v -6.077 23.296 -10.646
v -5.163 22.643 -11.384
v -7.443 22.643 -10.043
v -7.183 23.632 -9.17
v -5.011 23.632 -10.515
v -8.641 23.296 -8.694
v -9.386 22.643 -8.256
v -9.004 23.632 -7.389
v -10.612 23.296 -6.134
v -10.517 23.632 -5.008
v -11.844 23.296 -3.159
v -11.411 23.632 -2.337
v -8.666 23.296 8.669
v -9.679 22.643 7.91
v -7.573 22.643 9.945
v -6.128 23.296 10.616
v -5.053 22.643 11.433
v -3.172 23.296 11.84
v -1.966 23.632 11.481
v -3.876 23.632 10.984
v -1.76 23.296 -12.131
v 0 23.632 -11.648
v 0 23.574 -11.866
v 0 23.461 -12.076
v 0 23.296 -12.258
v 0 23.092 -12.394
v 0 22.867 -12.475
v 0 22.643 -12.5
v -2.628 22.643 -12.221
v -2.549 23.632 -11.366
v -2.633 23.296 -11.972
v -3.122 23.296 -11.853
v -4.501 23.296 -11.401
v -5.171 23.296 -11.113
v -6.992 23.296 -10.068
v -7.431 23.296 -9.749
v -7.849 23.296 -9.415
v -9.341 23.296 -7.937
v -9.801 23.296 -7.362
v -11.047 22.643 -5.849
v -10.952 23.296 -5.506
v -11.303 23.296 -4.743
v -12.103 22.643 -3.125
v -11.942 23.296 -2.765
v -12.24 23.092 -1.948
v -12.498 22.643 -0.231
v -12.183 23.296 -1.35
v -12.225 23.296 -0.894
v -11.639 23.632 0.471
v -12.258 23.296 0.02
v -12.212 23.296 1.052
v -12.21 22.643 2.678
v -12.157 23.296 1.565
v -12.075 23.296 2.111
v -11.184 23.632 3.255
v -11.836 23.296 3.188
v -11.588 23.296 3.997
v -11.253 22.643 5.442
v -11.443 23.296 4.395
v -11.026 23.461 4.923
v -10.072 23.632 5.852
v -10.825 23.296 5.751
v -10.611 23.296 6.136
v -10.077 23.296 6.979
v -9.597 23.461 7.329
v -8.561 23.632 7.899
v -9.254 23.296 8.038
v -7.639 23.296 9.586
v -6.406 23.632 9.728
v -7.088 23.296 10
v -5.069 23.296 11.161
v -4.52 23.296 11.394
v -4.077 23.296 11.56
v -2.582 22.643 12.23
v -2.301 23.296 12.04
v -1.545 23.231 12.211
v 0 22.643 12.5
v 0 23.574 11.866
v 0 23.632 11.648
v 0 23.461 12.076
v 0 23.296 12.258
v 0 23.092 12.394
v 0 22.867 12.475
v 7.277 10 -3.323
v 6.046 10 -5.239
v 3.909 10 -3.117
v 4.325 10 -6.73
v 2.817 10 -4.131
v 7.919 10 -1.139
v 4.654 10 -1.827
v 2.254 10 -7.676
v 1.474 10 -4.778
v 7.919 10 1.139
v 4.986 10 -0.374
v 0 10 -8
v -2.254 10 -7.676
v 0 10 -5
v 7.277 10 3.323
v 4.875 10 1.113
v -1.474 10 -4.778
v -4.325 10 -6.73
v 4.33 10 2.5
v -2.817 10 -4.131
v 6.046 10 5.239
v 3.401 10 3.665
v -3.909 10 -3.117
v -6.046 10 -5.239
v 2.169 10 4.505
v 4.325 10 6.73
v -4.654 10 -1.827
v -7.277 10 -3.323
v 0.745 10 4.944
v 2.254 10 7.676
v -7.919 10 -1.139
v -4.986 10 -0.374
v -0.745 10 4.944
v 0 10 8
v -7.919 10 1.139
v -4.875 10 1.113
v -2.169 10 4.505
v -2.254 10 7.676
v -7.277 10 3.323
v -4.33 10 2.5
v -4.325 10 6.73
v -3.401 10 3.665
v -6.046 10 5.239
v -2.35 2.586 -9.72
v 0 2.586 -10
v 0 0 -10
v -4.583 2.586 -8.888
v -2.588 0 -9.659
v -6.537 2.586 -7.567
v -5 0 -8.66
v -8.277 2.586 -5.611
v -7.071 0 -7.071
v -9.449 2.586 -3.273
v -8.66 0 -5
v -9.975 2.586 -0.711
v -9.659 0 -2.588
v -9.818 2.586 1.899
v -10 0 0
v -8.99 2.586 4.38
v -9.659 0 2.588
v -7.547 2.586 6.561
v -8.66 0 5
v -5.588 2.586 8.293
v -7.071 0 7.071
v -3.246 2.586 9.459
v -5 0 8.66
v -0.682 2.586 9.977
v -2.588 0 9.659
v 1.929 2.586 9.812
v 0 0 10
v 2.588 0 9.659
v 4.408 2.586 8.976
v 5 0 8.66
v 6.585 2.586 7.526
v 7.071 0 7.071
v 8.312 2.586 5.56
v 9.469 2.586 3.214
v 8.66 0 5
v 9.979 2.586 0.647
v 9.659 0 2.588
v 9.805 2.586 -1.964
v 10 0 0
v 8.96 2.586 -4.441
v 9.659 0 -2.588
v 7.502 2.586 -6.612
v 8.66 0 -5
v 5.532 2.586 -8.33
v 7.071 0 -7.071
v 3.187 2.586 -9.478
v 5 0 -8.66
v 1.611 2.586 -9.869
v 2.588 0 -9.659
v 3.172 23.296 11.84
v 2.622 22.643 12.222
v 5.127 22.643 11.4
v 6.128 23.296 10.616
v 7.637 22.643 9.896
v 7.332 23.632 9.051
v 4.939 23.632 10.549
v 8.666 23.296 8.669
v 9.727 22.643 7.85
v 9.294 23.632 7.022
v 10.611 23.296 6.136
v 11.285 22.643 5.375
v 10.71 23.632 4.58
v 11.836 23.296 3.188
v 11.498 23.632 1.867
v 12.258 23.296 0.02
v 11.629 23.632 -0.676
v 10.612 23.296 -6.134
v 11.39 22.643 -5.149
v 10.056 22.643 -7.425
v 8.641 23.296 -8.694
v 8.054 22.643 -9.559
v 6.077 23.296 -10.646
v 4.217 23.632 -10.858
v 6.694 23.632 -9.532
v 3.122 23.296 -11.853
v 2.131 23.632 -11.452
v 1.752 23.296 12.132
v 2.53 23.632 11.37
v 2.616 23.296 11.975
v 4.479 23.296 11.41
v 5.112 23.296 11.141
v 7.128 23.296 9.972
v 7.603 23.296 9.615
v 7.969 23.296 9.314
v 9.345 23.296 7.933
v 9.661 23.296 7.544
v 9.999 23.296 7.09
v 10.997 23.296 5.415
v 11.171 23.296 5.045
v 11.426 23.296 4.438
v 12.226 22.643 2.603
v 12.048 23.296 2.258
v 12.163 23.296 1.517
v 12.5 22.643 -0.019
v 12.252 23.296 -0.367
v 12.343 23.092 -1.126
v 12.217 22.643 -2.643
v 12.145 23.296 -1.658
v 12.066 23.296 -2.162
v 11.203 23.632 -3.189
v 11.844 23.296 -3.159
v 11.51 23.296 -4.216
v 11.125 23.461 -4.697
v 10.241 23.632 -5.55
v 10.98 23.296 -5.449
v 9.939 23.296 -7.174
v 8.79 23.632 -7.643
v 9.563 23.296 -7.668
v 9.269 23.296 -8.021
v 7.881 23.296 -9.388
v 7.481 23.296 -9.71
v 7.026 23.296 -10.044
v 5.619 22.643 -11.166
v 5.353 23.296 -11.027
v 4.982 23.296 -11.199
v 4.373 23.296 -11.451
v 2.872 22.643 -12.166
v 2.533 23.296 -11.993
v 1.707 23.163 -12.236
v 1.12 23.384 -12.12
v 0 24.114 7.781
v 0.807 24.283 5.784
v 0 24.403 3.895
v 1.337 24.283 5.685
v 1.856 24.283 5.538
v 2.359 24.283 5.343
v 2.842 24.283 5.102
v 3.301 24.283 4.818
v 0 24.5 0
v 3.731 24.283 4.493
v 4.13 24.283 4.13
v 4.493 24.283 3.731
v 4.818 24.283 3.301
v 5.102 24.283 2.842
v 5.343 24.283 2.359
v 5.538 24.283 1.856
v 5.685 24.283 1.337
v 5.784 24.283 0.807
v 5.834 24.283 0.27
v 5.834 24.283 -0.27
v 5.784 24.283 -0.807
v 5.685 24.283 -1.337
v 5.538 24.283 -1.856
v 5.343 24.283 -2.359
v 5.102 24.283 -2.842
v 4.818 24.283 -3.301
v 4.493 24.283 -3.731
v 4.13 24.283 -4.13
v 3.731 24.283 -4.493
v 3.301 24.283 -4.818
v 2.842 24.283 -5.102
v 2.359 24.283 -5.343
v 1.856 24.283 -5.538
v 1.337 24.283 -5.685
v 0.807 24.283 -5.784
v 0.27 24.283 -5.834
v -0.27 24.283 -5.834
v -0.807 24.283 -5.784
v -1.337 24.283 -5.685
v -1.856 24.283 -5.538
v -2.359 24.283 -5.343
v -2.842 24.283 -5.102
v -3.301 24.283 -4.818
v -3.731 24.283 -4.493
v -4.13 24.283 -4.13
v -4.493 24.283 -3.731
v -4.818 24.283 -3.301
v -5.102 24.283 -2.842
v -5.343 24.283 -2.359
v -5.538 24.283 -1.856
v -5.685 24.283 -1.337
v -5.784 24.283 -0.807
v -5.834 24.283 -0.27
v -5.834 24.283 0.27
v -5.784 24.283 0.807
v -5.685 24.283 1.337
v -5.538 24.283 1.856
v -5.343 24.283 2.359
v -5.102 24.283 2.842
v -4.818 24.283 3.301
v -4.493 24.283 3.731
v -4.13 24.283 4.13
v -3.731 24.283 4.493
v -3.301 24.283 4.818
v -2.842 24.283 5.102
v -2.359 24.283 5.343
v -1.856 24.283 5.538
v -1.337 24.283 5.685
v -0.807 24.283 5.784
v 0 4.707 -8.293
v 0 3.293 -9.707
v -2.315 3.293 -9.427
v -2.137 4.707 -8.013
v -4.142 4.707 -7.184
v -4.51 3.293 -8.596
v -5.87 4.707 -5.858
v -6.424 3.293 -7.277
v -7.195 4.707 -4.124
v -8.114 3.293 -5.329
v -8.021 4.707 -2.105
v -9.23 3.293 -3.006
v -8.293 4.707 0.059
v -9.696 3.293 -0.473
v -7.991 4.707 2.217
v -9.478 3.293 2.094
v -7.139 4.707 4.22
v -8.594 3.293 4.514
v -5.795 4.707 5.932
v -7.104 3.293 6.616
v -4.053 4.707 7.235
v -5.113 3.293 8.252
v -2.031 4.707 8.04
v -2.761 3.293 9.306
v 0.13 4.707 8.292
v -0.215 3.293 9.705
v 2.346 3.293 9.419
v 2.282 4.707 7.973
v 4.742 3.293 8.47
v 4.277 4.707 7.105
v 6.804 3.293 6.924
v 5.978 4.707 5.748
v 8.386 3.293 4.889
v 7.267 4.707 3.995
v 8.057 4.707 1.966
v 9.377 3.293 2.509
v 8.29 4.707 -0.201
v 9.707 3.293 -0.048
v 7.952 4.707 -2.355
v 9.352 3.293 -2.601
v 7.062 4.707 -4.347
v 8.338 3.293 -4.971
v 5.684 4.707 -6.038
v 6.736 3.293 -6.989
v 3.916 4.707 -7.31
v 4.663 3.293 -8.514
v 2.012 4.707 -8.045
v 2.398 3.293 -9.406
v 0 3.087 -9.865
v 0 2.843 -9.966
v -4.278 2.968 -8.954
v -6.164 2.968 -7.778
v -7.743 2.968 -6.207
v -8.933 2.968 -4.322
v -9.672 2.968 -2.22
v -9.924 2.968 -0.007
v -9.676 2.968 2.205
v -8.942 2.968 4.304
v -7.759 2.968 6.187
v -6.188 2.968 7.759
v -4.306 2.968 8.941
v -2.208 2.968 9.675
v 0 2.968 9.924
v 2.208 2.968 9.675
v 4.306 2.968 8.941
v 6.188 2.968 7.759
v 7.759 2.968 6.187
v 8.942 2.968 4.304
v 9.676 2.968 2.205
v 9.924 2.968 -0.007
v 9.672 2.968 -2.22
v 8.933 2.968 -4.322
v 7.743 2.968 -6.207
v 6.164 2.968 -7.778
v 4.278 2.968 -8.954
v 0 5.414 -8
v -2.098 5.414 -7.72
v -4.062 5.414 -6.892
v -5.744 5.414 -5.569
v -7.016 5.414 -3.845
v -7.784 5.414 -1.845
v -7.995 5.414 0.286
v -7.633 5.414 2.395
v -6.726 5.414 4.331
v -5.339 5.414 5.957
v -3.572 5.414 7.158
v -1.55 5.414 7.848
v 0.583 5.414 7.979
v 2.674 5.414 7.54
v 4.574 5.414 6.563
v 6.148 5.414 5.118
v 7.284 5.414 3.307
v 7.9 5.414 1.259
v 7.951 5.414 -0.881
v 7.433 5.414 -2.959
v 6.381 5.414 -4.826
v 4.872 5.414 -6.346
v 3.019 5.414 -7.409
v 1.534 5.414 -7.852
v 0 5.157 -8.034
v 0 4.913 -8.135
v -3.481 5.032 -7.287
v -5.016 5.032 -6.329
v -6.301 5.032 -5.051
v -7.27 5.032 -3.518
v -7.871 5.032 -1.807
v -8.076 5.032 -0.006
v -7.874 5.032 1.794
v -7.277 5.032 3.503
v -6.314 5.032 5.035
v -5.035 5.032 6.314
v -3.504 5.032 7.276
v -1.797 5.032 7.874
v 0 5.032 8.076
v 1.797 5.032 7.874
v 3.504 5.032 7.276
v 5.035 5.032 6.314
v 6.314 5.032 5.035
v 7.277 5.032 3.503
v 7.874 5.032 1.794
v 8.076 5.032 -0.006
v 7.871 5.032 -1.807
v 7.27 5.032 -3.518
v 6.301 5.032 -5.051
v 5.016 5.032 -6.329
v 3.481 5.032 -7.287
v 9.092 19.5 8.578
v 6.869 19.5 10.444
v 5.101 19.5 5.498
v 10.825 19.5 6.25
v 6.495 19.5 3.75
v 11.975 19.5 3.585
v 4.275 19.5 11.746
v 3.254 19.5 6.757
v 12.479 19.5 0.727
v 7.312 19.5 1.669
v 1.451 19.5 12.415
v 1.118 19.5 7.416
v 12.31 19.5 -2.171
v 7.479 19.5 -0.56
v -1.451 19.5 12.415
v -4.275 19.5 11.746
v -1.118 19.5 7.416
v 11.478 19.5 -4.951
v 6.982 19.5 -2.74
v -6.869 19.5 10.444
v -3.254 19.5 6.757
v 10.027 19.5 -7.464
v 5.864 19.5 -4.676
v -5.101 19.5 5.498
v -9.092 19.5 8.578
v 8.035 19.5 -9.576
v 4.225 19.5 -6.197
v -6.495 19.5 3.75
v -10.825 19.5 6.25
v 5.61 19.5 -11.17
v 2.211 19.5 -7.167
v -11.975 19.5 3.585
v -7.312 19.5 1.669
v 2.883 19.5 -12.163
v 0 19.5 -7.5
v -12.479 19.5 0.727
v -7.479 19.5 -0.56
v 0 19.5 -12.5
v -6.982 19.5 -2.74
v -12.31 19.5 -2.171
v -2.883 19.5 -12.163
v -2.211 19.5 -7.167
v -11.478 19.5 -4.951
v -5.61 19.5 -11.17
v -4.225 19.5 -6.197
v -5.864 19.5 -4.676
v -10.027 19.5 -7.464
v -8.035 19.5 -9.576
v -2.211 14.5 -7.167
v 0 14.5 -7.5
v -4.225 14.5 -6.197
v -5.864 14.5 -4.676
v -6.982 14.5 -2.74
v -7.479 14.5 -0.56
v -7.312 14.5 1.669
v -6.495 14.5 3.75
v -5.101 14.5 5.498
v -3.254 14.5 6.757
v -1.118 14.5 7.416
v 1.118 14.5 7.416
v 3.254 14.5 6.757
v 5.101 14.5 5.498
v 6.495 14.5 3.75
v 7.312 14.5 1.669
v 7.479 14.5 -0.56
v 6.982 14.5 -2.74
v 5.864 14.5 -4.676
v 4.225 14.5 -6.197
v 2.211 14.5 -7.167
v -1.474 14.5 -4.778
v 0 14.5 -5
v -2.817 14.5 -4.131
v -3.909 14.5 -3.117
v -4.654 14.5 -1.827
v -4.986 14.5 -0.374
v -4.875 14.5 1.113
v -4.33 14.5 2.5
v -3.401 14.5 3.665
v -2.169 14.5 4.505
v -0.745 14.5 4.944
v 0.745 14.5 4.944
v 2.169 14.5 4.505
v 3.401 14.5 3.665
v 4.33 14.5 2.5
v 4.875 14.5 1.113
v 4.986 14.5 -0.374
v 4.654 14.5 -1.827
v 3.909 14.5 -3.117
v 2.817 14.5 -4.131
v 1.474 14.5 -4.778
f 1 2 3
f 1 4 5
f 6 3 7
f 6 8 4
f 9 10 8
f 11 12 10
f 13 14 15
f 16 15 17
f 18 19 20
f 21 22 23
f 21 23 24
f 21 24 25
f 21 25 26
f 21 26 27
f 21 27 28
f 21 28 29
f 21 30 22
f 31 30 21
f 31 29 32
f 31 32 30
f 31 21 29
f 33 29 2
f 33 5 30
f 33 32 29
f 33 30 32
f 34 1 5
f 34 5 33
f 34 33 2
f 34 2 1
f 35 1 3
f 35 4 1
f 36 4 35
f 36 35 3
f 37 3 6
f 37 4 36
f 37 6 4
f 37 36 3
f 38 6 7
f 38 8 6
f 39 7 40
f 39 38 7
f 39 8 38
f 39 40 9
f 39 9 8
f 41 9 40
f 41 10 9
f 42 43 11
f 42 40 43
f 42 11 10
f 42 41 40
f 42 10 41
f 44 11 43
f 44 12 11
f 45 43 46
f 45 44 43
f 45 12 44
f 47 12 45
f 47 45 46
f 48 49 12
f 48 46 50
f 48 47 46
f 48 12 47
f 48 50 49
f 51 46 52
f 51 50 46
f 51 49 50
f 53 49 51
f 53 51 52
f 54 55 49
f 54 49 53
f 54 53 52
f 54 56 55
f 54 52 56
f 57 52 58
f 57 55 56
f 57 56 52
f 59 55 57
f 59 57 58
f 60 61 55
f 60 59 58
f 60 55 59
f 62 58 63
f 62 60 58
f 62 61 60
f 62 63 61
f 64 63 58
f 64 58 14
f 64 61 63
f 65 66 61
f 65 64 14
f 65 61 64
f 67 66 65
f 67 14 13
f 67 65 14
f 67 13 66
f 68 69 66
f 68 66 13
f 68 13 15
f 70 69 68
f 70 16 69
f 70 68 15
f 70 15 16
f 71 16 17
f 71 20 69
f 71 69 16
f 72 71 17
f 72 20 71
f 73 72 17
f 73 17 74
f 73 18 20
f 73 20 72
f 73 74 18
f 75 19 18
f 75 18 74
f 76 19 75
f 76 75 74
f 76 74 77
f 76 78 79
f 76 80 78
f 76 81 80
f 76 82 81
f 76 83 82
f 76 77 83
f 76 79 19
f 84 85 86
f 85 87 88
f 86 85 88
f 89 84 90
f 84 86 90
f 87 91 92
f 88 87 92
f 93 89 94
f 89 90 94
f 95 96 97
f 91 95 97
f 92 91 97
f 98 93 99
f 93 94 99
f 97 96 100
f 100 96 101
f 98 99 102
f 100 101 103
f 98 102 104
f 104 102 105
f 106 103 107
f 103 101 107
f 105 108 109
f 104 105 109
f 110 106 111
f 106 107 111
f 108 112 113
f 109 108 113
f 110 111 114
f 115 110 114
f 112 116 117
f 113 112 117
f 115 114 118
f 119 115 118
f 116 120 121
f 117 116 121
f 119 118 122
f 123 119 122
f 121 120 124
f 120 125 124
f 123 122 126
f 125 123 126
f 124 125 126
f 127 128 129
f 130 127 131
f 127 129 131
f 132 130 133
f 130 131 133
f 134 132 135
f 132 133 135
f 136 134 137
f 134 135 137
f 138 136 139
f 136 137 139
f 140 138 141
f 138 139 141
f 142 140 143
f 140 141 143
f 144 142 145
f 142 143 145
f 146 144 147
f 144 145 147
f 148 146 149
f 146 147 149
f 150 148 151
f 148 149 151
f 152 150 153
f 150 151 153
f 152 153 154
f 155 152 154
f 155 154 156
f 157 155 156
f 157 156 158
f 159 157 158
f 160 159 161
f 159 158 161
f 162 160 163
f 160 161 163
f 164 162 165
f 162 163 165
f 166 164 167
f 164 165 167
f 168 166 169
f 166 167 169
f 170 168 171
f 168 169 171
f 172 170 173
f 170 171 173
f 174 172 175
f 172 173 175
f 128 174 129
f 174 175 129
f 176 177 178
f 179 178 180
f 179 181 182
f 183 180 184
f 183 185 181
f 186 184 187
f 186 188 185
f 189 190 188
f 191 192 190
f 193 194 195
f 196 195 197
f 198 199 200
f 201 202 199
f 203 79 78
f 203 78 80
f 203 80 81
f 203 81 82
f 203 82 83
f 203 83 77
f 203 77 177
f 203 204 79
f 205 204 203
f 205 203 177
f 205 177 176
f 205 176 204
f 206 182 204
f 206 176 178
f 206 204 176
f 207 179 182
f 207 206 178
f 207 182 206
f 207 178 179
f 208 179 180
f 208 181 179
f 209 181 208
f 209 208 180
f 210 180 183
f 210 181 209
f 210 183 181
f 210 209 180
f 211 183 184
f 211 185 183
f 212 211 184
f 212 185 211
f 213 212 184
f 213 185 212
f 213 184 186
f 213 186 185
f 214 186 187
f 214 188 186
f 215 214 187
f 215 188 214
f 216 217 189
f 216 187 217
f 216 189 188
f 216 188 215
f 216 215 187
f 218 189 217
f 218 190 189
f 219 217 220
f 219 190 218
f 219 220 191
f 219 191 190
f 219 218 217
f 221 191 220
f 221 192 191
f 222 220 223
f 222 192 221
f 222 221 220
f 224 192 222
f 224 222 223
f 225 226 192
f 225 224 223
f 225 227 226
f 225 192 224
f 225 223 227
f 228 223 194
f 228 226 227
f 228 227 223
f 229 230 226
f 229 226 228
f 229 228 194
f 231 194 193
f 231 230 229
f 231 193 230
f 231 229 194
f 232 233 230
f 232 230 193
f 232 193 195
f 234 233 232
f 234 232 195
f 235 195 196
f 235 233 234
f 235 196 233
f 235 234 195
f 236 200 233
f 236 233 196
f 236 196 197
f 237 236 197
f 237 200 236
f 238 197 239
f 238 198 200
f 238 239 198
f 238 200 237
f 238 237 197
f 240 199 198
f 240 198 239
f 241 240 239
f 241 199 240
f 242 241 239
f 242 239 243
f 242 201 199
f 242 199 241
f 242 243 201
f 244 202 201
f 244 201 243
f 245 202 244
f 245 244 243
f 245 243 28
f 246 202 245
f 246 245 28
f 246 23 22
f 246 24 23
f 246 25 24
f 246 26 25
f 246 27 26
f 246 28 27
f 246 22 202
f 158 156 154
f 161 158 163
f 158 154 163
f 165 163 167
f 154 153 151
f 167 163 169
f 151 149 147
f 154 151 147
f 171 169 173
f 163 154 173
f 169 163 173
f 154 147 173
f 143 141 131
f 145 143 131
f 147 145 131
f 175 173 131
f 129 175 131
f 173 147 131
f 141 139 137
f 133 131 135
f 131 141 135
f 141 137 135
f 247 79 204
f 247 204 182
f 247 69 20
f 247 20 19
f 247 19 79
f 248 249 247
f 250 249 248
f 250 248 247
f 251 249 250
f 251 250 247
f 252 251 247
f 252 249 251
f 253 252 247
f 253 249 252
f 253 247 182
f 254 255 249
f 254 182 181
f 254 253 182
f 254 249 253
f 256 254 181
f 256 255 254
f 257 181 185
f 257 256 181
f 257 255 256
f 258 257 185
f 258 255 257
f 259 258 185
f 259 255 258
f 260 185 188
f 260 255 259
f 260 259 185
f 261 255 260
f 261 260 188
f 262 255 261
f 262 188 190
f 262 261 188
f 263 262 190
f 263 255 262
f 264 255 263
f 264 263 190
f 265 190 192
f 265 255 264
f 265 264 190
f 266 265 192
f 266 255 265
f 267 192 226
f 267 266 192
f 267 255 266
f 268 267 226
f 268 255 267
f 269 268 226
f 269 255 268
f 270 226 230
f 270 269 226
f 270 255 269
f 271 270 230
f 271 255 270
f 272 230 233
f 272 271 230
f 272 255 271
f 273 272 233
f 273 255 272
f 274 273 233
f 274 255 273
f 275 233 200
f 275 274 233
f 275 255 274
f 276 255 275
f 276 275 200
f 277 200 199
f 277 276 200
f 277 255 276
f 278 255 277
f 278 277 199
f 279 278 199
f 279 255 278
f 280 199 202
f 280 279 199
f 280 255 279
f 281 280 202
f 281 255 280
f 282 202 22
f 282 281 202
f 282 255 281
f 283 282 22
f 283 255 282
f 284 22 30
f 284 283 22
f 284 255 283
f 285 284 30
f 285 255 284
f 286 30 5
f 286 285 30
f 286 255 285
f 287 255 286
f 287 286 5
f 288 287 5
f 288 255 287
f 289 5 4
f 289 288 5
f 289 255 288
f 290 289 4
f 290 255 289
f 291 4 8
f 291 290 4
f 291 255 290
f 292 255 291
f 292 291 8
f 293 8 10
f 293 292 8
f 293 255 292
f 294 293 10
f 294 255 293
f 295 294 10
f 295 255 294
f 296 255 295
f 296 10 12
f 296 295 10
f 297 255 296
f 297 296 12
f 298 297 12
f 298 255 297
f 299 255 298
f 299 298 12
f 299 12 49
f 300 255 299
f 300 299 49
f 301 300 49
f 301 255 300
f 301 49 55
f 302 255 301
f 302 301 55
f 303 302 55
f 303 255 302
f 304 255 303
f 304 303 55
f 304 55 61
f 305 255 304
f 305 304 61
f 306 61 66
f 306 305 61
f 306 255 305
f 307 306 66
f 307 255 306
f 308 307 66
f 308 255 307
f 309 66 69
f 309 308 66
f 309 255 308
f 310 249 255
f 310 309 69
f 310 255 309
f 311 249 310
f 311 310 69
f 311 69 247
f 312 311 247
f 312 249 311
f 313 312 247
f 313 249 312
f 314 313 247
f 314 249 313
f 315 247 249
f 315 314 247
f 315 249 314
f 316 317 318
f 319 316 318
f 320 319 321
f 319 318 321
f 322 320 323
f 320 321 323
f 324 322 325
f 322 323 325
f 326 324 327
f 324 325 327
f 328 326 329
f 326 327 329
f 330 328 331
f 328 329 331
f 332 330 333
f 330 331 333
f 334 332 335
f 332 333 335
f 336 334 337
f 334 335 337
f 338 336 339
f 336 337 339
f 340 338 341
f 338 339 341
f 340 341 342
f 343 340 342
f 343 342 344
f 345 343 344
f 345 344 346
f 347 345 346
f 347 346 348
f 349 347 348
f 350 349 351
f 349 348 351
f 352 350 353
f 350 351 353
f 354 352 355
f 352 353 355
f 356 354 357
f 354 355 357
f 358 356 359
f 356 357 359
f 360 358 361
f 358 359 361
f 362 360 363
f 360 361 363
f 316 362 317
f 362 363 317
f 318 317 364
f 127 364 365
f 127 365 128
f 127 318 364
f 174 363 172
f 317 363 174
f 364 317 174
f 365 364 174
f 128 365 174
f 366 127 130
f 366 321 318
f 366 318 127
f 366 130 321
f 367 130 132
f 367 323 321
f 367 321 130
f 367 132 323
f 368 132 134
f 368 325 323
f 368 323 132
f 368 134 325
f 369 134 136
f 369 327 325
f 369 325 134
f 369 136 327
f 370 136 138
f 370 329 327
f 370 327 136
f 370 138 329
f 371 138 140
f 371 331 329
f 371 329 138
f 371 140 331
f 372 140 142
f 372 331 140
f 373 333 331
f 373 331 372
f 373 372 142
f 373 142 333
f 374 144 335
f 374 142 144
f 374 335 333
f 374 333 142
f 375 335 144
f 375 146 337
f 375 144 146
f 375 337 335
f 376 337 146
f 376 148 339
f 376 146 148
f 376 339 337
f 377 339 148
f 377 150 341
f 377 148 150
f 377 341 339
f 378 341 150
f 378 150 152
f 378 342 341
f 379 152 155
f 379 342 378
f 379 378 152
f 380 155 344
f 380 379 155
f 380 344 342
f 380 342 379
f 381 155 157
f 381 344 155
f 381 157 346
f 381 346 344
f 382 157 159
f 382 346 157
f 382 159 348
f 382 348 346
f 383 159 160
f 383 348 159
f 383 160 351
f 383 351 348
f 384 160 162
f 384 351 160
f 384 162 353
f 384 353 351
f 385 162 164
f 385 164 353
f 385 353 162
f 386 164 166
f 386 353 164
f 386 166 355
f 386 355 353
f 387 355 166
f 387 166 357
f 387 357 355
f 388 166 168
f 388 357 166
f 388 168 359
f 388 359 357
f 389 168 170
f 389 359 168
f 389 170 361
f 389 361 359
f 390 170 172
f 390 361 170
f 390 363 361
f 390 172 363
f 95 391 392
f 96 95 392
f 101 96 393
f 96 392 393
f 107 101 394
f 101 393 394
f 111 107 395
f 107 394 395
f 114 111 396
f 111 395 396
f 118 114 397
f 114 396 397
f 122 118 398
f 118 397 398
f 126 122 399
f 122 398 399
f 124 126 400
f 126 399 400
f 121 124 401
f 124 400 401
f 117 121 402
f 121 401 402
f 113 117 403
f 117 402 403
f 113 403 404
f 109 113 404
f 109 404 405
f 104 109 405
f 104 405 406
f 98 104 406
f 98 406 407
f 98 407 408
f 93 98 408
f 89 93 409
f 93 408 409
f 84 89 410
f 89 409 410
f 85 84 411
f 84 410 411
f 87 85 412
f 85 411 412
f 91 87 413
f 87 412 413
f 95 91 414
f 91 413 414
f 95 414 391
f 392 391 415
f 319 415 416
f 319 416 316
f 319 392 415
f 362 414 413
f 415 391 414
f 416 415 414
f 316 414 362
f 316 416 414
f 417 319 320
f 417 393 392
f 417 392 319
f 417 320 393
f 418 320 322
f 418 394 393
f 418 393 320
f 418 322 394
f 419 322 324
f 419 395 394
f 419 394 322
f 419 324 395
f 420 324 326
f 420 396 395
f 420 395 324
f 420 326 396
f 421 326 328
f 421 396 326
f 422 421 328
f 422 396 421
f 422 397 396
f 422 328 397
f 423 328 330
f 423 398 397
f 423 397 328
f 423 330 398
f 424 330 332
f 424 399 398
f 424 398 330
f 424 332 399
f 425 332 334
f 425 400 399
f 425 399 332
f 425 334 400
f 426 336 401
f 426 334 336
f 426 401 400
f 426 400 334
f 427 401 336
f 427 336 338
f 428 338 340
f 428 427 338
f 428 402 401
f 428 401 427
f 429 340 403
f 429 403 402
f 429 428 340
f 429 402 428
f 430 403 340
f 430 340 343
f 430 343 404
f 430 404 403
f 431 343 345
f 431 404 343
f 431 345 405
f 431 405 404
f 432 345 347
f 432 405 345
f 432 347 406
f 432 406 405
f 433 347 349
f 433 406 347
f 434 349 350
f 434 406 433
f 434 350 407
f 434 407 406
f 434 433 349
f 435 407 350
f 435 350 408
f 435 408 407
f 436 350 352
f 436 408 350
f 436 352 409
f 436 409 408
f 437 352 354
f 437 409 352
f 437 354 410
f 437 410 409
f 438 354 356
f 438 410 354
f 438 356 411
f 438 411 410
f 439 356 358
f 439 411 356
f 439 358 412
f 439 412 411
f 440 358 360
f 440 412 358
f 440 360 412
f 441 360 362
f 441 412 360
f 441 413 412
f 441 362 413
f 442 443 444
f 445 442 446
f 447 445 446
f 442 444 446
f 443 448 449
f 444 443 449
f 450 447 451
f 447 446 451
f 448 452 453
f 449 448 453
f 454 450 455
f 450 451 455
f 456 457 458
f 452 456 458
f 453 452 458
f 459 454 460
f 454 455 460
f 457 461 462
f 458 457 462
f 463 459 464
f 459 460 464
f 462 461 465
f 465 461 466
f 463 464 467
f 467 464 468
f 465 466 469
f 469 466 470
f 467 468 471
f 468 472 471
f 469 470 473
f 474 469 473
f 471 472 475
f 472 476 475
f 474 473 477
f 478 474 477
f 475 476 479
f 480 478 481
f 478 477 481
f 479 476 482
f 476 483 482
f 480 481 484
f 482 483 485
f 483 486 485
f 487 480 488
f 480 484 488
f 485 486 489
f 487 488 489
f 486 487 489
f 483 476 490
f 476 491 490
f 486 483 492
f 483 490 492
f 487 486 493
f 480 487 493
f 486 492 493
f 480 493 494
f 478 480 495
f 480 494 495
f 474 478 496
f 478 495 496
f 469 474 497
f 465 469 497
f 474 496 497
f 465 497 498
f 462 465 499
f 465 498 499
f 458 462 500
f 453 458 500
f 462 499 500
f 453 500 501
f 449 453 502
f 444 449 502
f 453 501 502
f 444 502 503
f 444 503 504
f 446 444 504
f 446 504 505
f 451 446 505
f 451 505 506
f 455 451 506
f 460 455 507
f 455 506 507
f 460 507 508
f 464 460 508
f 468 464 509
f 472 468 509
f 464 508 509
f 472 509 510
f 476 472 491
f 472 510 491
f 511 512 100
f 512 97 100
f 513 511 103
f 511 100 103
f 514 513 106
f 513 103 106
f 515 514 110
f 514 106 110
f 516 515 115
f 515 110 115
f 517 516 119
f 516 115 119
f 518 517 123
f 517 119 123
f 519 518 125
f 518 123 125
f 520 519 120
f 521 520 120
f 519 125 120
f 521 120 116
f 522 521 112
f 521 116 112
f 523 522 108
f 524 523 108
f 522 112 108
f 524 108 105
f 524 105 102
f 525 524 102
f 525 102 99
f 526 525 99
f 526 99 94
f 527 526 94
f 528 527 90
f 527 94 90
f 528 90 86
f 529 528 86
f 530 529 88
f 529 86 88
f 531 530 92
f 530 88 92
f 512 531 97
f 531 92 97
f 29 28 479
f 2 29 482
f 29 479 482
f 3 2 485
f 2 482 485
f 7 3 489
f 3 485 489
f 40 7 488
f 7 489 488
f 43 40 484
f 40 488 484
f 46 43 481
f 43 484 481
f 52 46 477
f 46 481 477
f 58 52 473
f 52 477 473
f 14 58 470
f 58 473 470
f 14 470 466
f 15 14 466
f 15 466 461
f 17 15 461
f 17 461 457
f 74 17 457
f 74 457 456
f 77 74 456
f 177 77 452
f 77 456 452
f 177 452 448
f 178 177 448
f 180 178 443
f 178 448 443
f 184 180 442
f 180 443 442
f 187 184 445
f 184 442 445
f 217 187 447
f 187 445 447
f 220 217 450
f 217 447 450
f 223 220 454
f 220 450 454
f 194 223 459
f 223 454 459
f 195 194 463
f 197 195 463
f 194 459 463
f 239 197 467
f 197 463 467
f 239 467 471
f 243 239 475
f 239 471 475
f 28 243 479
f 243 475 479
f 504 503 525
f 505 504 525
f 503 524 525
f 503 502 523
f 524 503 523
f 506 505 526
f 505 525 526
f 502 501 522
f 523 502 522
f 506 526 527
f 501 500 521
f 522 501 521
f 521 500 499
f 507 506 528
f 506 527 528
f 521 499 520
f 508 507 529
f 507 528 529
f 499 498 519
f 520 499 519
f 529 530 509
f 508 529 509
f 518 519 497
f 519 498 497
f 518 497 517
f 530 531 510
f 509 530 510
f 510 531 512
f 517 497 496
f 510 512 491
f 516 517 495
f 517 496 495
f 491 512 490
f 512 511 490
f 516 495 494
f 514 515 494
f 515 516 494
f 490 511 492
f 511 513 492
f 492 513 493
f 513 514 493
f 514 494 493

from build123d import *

# Parameters (mm, degrees)
DOME1_FACE_RADIUS = 12.5
DOME1_HEIGHT      = 1
FILLET1_R         = 1


with BuildPart() as part:
    # Sketch1 → Revolve1 (revolve)
    with BuildSketch(Plane.XY, mode=Mode.PRIVATE) as revolve1_sk:
        Polygon((0, 23.5), (12.5, 23.5), (12.5, 19.5), (7.5, 19.5), (7.5, 14.5), (5, 14.5), (5, 10), (8, 10), (8, 5), (10, 3), (10, 0), (0, 0), align=None)
    revolve(revolve1_sk.sketch.rotate(Axis((0, 0, 0), (0, 1, 0)), 90), axis=Axis((0, 0, 0), (0, 1, 0)))

    # Dome1: a dome of height H over a round flat face of radius A is a cap of a sphere of radius (A * A + H * H) / (2 * H)
    dome1_r = (DOME1_FACE_RADIUS * DOME1_FACE_RADIUS + DOME1_HEIGHT * DOME1_HEIGHT) / (2 * DOME1_HEIGHT)
    dome1_base = Plane((0, 23.5, 0), z_dir=(0, 1, 0))
    with Locations(dome1_base.offset(DOME1_HEIGHT - dome1_r)):
        dome1_ball = Sphere(dome1_r, mode=Mode.PRIVATE)
    add(split(dome1_ball, bisect_by=dome1_base, keep=Keep.TOP, mode=Mode.PRIVATE))

    # Fillet1
    fillet1_edges = [part.edges().sort_by_distance(p)[0] for p in [
        (12.5, 23.5, 0),
        (0, 3, 10),
        (0, 5, 8),
    ]]
    fillet(fillet1_edges, radius=FILLET1_R)


solid = part.part
